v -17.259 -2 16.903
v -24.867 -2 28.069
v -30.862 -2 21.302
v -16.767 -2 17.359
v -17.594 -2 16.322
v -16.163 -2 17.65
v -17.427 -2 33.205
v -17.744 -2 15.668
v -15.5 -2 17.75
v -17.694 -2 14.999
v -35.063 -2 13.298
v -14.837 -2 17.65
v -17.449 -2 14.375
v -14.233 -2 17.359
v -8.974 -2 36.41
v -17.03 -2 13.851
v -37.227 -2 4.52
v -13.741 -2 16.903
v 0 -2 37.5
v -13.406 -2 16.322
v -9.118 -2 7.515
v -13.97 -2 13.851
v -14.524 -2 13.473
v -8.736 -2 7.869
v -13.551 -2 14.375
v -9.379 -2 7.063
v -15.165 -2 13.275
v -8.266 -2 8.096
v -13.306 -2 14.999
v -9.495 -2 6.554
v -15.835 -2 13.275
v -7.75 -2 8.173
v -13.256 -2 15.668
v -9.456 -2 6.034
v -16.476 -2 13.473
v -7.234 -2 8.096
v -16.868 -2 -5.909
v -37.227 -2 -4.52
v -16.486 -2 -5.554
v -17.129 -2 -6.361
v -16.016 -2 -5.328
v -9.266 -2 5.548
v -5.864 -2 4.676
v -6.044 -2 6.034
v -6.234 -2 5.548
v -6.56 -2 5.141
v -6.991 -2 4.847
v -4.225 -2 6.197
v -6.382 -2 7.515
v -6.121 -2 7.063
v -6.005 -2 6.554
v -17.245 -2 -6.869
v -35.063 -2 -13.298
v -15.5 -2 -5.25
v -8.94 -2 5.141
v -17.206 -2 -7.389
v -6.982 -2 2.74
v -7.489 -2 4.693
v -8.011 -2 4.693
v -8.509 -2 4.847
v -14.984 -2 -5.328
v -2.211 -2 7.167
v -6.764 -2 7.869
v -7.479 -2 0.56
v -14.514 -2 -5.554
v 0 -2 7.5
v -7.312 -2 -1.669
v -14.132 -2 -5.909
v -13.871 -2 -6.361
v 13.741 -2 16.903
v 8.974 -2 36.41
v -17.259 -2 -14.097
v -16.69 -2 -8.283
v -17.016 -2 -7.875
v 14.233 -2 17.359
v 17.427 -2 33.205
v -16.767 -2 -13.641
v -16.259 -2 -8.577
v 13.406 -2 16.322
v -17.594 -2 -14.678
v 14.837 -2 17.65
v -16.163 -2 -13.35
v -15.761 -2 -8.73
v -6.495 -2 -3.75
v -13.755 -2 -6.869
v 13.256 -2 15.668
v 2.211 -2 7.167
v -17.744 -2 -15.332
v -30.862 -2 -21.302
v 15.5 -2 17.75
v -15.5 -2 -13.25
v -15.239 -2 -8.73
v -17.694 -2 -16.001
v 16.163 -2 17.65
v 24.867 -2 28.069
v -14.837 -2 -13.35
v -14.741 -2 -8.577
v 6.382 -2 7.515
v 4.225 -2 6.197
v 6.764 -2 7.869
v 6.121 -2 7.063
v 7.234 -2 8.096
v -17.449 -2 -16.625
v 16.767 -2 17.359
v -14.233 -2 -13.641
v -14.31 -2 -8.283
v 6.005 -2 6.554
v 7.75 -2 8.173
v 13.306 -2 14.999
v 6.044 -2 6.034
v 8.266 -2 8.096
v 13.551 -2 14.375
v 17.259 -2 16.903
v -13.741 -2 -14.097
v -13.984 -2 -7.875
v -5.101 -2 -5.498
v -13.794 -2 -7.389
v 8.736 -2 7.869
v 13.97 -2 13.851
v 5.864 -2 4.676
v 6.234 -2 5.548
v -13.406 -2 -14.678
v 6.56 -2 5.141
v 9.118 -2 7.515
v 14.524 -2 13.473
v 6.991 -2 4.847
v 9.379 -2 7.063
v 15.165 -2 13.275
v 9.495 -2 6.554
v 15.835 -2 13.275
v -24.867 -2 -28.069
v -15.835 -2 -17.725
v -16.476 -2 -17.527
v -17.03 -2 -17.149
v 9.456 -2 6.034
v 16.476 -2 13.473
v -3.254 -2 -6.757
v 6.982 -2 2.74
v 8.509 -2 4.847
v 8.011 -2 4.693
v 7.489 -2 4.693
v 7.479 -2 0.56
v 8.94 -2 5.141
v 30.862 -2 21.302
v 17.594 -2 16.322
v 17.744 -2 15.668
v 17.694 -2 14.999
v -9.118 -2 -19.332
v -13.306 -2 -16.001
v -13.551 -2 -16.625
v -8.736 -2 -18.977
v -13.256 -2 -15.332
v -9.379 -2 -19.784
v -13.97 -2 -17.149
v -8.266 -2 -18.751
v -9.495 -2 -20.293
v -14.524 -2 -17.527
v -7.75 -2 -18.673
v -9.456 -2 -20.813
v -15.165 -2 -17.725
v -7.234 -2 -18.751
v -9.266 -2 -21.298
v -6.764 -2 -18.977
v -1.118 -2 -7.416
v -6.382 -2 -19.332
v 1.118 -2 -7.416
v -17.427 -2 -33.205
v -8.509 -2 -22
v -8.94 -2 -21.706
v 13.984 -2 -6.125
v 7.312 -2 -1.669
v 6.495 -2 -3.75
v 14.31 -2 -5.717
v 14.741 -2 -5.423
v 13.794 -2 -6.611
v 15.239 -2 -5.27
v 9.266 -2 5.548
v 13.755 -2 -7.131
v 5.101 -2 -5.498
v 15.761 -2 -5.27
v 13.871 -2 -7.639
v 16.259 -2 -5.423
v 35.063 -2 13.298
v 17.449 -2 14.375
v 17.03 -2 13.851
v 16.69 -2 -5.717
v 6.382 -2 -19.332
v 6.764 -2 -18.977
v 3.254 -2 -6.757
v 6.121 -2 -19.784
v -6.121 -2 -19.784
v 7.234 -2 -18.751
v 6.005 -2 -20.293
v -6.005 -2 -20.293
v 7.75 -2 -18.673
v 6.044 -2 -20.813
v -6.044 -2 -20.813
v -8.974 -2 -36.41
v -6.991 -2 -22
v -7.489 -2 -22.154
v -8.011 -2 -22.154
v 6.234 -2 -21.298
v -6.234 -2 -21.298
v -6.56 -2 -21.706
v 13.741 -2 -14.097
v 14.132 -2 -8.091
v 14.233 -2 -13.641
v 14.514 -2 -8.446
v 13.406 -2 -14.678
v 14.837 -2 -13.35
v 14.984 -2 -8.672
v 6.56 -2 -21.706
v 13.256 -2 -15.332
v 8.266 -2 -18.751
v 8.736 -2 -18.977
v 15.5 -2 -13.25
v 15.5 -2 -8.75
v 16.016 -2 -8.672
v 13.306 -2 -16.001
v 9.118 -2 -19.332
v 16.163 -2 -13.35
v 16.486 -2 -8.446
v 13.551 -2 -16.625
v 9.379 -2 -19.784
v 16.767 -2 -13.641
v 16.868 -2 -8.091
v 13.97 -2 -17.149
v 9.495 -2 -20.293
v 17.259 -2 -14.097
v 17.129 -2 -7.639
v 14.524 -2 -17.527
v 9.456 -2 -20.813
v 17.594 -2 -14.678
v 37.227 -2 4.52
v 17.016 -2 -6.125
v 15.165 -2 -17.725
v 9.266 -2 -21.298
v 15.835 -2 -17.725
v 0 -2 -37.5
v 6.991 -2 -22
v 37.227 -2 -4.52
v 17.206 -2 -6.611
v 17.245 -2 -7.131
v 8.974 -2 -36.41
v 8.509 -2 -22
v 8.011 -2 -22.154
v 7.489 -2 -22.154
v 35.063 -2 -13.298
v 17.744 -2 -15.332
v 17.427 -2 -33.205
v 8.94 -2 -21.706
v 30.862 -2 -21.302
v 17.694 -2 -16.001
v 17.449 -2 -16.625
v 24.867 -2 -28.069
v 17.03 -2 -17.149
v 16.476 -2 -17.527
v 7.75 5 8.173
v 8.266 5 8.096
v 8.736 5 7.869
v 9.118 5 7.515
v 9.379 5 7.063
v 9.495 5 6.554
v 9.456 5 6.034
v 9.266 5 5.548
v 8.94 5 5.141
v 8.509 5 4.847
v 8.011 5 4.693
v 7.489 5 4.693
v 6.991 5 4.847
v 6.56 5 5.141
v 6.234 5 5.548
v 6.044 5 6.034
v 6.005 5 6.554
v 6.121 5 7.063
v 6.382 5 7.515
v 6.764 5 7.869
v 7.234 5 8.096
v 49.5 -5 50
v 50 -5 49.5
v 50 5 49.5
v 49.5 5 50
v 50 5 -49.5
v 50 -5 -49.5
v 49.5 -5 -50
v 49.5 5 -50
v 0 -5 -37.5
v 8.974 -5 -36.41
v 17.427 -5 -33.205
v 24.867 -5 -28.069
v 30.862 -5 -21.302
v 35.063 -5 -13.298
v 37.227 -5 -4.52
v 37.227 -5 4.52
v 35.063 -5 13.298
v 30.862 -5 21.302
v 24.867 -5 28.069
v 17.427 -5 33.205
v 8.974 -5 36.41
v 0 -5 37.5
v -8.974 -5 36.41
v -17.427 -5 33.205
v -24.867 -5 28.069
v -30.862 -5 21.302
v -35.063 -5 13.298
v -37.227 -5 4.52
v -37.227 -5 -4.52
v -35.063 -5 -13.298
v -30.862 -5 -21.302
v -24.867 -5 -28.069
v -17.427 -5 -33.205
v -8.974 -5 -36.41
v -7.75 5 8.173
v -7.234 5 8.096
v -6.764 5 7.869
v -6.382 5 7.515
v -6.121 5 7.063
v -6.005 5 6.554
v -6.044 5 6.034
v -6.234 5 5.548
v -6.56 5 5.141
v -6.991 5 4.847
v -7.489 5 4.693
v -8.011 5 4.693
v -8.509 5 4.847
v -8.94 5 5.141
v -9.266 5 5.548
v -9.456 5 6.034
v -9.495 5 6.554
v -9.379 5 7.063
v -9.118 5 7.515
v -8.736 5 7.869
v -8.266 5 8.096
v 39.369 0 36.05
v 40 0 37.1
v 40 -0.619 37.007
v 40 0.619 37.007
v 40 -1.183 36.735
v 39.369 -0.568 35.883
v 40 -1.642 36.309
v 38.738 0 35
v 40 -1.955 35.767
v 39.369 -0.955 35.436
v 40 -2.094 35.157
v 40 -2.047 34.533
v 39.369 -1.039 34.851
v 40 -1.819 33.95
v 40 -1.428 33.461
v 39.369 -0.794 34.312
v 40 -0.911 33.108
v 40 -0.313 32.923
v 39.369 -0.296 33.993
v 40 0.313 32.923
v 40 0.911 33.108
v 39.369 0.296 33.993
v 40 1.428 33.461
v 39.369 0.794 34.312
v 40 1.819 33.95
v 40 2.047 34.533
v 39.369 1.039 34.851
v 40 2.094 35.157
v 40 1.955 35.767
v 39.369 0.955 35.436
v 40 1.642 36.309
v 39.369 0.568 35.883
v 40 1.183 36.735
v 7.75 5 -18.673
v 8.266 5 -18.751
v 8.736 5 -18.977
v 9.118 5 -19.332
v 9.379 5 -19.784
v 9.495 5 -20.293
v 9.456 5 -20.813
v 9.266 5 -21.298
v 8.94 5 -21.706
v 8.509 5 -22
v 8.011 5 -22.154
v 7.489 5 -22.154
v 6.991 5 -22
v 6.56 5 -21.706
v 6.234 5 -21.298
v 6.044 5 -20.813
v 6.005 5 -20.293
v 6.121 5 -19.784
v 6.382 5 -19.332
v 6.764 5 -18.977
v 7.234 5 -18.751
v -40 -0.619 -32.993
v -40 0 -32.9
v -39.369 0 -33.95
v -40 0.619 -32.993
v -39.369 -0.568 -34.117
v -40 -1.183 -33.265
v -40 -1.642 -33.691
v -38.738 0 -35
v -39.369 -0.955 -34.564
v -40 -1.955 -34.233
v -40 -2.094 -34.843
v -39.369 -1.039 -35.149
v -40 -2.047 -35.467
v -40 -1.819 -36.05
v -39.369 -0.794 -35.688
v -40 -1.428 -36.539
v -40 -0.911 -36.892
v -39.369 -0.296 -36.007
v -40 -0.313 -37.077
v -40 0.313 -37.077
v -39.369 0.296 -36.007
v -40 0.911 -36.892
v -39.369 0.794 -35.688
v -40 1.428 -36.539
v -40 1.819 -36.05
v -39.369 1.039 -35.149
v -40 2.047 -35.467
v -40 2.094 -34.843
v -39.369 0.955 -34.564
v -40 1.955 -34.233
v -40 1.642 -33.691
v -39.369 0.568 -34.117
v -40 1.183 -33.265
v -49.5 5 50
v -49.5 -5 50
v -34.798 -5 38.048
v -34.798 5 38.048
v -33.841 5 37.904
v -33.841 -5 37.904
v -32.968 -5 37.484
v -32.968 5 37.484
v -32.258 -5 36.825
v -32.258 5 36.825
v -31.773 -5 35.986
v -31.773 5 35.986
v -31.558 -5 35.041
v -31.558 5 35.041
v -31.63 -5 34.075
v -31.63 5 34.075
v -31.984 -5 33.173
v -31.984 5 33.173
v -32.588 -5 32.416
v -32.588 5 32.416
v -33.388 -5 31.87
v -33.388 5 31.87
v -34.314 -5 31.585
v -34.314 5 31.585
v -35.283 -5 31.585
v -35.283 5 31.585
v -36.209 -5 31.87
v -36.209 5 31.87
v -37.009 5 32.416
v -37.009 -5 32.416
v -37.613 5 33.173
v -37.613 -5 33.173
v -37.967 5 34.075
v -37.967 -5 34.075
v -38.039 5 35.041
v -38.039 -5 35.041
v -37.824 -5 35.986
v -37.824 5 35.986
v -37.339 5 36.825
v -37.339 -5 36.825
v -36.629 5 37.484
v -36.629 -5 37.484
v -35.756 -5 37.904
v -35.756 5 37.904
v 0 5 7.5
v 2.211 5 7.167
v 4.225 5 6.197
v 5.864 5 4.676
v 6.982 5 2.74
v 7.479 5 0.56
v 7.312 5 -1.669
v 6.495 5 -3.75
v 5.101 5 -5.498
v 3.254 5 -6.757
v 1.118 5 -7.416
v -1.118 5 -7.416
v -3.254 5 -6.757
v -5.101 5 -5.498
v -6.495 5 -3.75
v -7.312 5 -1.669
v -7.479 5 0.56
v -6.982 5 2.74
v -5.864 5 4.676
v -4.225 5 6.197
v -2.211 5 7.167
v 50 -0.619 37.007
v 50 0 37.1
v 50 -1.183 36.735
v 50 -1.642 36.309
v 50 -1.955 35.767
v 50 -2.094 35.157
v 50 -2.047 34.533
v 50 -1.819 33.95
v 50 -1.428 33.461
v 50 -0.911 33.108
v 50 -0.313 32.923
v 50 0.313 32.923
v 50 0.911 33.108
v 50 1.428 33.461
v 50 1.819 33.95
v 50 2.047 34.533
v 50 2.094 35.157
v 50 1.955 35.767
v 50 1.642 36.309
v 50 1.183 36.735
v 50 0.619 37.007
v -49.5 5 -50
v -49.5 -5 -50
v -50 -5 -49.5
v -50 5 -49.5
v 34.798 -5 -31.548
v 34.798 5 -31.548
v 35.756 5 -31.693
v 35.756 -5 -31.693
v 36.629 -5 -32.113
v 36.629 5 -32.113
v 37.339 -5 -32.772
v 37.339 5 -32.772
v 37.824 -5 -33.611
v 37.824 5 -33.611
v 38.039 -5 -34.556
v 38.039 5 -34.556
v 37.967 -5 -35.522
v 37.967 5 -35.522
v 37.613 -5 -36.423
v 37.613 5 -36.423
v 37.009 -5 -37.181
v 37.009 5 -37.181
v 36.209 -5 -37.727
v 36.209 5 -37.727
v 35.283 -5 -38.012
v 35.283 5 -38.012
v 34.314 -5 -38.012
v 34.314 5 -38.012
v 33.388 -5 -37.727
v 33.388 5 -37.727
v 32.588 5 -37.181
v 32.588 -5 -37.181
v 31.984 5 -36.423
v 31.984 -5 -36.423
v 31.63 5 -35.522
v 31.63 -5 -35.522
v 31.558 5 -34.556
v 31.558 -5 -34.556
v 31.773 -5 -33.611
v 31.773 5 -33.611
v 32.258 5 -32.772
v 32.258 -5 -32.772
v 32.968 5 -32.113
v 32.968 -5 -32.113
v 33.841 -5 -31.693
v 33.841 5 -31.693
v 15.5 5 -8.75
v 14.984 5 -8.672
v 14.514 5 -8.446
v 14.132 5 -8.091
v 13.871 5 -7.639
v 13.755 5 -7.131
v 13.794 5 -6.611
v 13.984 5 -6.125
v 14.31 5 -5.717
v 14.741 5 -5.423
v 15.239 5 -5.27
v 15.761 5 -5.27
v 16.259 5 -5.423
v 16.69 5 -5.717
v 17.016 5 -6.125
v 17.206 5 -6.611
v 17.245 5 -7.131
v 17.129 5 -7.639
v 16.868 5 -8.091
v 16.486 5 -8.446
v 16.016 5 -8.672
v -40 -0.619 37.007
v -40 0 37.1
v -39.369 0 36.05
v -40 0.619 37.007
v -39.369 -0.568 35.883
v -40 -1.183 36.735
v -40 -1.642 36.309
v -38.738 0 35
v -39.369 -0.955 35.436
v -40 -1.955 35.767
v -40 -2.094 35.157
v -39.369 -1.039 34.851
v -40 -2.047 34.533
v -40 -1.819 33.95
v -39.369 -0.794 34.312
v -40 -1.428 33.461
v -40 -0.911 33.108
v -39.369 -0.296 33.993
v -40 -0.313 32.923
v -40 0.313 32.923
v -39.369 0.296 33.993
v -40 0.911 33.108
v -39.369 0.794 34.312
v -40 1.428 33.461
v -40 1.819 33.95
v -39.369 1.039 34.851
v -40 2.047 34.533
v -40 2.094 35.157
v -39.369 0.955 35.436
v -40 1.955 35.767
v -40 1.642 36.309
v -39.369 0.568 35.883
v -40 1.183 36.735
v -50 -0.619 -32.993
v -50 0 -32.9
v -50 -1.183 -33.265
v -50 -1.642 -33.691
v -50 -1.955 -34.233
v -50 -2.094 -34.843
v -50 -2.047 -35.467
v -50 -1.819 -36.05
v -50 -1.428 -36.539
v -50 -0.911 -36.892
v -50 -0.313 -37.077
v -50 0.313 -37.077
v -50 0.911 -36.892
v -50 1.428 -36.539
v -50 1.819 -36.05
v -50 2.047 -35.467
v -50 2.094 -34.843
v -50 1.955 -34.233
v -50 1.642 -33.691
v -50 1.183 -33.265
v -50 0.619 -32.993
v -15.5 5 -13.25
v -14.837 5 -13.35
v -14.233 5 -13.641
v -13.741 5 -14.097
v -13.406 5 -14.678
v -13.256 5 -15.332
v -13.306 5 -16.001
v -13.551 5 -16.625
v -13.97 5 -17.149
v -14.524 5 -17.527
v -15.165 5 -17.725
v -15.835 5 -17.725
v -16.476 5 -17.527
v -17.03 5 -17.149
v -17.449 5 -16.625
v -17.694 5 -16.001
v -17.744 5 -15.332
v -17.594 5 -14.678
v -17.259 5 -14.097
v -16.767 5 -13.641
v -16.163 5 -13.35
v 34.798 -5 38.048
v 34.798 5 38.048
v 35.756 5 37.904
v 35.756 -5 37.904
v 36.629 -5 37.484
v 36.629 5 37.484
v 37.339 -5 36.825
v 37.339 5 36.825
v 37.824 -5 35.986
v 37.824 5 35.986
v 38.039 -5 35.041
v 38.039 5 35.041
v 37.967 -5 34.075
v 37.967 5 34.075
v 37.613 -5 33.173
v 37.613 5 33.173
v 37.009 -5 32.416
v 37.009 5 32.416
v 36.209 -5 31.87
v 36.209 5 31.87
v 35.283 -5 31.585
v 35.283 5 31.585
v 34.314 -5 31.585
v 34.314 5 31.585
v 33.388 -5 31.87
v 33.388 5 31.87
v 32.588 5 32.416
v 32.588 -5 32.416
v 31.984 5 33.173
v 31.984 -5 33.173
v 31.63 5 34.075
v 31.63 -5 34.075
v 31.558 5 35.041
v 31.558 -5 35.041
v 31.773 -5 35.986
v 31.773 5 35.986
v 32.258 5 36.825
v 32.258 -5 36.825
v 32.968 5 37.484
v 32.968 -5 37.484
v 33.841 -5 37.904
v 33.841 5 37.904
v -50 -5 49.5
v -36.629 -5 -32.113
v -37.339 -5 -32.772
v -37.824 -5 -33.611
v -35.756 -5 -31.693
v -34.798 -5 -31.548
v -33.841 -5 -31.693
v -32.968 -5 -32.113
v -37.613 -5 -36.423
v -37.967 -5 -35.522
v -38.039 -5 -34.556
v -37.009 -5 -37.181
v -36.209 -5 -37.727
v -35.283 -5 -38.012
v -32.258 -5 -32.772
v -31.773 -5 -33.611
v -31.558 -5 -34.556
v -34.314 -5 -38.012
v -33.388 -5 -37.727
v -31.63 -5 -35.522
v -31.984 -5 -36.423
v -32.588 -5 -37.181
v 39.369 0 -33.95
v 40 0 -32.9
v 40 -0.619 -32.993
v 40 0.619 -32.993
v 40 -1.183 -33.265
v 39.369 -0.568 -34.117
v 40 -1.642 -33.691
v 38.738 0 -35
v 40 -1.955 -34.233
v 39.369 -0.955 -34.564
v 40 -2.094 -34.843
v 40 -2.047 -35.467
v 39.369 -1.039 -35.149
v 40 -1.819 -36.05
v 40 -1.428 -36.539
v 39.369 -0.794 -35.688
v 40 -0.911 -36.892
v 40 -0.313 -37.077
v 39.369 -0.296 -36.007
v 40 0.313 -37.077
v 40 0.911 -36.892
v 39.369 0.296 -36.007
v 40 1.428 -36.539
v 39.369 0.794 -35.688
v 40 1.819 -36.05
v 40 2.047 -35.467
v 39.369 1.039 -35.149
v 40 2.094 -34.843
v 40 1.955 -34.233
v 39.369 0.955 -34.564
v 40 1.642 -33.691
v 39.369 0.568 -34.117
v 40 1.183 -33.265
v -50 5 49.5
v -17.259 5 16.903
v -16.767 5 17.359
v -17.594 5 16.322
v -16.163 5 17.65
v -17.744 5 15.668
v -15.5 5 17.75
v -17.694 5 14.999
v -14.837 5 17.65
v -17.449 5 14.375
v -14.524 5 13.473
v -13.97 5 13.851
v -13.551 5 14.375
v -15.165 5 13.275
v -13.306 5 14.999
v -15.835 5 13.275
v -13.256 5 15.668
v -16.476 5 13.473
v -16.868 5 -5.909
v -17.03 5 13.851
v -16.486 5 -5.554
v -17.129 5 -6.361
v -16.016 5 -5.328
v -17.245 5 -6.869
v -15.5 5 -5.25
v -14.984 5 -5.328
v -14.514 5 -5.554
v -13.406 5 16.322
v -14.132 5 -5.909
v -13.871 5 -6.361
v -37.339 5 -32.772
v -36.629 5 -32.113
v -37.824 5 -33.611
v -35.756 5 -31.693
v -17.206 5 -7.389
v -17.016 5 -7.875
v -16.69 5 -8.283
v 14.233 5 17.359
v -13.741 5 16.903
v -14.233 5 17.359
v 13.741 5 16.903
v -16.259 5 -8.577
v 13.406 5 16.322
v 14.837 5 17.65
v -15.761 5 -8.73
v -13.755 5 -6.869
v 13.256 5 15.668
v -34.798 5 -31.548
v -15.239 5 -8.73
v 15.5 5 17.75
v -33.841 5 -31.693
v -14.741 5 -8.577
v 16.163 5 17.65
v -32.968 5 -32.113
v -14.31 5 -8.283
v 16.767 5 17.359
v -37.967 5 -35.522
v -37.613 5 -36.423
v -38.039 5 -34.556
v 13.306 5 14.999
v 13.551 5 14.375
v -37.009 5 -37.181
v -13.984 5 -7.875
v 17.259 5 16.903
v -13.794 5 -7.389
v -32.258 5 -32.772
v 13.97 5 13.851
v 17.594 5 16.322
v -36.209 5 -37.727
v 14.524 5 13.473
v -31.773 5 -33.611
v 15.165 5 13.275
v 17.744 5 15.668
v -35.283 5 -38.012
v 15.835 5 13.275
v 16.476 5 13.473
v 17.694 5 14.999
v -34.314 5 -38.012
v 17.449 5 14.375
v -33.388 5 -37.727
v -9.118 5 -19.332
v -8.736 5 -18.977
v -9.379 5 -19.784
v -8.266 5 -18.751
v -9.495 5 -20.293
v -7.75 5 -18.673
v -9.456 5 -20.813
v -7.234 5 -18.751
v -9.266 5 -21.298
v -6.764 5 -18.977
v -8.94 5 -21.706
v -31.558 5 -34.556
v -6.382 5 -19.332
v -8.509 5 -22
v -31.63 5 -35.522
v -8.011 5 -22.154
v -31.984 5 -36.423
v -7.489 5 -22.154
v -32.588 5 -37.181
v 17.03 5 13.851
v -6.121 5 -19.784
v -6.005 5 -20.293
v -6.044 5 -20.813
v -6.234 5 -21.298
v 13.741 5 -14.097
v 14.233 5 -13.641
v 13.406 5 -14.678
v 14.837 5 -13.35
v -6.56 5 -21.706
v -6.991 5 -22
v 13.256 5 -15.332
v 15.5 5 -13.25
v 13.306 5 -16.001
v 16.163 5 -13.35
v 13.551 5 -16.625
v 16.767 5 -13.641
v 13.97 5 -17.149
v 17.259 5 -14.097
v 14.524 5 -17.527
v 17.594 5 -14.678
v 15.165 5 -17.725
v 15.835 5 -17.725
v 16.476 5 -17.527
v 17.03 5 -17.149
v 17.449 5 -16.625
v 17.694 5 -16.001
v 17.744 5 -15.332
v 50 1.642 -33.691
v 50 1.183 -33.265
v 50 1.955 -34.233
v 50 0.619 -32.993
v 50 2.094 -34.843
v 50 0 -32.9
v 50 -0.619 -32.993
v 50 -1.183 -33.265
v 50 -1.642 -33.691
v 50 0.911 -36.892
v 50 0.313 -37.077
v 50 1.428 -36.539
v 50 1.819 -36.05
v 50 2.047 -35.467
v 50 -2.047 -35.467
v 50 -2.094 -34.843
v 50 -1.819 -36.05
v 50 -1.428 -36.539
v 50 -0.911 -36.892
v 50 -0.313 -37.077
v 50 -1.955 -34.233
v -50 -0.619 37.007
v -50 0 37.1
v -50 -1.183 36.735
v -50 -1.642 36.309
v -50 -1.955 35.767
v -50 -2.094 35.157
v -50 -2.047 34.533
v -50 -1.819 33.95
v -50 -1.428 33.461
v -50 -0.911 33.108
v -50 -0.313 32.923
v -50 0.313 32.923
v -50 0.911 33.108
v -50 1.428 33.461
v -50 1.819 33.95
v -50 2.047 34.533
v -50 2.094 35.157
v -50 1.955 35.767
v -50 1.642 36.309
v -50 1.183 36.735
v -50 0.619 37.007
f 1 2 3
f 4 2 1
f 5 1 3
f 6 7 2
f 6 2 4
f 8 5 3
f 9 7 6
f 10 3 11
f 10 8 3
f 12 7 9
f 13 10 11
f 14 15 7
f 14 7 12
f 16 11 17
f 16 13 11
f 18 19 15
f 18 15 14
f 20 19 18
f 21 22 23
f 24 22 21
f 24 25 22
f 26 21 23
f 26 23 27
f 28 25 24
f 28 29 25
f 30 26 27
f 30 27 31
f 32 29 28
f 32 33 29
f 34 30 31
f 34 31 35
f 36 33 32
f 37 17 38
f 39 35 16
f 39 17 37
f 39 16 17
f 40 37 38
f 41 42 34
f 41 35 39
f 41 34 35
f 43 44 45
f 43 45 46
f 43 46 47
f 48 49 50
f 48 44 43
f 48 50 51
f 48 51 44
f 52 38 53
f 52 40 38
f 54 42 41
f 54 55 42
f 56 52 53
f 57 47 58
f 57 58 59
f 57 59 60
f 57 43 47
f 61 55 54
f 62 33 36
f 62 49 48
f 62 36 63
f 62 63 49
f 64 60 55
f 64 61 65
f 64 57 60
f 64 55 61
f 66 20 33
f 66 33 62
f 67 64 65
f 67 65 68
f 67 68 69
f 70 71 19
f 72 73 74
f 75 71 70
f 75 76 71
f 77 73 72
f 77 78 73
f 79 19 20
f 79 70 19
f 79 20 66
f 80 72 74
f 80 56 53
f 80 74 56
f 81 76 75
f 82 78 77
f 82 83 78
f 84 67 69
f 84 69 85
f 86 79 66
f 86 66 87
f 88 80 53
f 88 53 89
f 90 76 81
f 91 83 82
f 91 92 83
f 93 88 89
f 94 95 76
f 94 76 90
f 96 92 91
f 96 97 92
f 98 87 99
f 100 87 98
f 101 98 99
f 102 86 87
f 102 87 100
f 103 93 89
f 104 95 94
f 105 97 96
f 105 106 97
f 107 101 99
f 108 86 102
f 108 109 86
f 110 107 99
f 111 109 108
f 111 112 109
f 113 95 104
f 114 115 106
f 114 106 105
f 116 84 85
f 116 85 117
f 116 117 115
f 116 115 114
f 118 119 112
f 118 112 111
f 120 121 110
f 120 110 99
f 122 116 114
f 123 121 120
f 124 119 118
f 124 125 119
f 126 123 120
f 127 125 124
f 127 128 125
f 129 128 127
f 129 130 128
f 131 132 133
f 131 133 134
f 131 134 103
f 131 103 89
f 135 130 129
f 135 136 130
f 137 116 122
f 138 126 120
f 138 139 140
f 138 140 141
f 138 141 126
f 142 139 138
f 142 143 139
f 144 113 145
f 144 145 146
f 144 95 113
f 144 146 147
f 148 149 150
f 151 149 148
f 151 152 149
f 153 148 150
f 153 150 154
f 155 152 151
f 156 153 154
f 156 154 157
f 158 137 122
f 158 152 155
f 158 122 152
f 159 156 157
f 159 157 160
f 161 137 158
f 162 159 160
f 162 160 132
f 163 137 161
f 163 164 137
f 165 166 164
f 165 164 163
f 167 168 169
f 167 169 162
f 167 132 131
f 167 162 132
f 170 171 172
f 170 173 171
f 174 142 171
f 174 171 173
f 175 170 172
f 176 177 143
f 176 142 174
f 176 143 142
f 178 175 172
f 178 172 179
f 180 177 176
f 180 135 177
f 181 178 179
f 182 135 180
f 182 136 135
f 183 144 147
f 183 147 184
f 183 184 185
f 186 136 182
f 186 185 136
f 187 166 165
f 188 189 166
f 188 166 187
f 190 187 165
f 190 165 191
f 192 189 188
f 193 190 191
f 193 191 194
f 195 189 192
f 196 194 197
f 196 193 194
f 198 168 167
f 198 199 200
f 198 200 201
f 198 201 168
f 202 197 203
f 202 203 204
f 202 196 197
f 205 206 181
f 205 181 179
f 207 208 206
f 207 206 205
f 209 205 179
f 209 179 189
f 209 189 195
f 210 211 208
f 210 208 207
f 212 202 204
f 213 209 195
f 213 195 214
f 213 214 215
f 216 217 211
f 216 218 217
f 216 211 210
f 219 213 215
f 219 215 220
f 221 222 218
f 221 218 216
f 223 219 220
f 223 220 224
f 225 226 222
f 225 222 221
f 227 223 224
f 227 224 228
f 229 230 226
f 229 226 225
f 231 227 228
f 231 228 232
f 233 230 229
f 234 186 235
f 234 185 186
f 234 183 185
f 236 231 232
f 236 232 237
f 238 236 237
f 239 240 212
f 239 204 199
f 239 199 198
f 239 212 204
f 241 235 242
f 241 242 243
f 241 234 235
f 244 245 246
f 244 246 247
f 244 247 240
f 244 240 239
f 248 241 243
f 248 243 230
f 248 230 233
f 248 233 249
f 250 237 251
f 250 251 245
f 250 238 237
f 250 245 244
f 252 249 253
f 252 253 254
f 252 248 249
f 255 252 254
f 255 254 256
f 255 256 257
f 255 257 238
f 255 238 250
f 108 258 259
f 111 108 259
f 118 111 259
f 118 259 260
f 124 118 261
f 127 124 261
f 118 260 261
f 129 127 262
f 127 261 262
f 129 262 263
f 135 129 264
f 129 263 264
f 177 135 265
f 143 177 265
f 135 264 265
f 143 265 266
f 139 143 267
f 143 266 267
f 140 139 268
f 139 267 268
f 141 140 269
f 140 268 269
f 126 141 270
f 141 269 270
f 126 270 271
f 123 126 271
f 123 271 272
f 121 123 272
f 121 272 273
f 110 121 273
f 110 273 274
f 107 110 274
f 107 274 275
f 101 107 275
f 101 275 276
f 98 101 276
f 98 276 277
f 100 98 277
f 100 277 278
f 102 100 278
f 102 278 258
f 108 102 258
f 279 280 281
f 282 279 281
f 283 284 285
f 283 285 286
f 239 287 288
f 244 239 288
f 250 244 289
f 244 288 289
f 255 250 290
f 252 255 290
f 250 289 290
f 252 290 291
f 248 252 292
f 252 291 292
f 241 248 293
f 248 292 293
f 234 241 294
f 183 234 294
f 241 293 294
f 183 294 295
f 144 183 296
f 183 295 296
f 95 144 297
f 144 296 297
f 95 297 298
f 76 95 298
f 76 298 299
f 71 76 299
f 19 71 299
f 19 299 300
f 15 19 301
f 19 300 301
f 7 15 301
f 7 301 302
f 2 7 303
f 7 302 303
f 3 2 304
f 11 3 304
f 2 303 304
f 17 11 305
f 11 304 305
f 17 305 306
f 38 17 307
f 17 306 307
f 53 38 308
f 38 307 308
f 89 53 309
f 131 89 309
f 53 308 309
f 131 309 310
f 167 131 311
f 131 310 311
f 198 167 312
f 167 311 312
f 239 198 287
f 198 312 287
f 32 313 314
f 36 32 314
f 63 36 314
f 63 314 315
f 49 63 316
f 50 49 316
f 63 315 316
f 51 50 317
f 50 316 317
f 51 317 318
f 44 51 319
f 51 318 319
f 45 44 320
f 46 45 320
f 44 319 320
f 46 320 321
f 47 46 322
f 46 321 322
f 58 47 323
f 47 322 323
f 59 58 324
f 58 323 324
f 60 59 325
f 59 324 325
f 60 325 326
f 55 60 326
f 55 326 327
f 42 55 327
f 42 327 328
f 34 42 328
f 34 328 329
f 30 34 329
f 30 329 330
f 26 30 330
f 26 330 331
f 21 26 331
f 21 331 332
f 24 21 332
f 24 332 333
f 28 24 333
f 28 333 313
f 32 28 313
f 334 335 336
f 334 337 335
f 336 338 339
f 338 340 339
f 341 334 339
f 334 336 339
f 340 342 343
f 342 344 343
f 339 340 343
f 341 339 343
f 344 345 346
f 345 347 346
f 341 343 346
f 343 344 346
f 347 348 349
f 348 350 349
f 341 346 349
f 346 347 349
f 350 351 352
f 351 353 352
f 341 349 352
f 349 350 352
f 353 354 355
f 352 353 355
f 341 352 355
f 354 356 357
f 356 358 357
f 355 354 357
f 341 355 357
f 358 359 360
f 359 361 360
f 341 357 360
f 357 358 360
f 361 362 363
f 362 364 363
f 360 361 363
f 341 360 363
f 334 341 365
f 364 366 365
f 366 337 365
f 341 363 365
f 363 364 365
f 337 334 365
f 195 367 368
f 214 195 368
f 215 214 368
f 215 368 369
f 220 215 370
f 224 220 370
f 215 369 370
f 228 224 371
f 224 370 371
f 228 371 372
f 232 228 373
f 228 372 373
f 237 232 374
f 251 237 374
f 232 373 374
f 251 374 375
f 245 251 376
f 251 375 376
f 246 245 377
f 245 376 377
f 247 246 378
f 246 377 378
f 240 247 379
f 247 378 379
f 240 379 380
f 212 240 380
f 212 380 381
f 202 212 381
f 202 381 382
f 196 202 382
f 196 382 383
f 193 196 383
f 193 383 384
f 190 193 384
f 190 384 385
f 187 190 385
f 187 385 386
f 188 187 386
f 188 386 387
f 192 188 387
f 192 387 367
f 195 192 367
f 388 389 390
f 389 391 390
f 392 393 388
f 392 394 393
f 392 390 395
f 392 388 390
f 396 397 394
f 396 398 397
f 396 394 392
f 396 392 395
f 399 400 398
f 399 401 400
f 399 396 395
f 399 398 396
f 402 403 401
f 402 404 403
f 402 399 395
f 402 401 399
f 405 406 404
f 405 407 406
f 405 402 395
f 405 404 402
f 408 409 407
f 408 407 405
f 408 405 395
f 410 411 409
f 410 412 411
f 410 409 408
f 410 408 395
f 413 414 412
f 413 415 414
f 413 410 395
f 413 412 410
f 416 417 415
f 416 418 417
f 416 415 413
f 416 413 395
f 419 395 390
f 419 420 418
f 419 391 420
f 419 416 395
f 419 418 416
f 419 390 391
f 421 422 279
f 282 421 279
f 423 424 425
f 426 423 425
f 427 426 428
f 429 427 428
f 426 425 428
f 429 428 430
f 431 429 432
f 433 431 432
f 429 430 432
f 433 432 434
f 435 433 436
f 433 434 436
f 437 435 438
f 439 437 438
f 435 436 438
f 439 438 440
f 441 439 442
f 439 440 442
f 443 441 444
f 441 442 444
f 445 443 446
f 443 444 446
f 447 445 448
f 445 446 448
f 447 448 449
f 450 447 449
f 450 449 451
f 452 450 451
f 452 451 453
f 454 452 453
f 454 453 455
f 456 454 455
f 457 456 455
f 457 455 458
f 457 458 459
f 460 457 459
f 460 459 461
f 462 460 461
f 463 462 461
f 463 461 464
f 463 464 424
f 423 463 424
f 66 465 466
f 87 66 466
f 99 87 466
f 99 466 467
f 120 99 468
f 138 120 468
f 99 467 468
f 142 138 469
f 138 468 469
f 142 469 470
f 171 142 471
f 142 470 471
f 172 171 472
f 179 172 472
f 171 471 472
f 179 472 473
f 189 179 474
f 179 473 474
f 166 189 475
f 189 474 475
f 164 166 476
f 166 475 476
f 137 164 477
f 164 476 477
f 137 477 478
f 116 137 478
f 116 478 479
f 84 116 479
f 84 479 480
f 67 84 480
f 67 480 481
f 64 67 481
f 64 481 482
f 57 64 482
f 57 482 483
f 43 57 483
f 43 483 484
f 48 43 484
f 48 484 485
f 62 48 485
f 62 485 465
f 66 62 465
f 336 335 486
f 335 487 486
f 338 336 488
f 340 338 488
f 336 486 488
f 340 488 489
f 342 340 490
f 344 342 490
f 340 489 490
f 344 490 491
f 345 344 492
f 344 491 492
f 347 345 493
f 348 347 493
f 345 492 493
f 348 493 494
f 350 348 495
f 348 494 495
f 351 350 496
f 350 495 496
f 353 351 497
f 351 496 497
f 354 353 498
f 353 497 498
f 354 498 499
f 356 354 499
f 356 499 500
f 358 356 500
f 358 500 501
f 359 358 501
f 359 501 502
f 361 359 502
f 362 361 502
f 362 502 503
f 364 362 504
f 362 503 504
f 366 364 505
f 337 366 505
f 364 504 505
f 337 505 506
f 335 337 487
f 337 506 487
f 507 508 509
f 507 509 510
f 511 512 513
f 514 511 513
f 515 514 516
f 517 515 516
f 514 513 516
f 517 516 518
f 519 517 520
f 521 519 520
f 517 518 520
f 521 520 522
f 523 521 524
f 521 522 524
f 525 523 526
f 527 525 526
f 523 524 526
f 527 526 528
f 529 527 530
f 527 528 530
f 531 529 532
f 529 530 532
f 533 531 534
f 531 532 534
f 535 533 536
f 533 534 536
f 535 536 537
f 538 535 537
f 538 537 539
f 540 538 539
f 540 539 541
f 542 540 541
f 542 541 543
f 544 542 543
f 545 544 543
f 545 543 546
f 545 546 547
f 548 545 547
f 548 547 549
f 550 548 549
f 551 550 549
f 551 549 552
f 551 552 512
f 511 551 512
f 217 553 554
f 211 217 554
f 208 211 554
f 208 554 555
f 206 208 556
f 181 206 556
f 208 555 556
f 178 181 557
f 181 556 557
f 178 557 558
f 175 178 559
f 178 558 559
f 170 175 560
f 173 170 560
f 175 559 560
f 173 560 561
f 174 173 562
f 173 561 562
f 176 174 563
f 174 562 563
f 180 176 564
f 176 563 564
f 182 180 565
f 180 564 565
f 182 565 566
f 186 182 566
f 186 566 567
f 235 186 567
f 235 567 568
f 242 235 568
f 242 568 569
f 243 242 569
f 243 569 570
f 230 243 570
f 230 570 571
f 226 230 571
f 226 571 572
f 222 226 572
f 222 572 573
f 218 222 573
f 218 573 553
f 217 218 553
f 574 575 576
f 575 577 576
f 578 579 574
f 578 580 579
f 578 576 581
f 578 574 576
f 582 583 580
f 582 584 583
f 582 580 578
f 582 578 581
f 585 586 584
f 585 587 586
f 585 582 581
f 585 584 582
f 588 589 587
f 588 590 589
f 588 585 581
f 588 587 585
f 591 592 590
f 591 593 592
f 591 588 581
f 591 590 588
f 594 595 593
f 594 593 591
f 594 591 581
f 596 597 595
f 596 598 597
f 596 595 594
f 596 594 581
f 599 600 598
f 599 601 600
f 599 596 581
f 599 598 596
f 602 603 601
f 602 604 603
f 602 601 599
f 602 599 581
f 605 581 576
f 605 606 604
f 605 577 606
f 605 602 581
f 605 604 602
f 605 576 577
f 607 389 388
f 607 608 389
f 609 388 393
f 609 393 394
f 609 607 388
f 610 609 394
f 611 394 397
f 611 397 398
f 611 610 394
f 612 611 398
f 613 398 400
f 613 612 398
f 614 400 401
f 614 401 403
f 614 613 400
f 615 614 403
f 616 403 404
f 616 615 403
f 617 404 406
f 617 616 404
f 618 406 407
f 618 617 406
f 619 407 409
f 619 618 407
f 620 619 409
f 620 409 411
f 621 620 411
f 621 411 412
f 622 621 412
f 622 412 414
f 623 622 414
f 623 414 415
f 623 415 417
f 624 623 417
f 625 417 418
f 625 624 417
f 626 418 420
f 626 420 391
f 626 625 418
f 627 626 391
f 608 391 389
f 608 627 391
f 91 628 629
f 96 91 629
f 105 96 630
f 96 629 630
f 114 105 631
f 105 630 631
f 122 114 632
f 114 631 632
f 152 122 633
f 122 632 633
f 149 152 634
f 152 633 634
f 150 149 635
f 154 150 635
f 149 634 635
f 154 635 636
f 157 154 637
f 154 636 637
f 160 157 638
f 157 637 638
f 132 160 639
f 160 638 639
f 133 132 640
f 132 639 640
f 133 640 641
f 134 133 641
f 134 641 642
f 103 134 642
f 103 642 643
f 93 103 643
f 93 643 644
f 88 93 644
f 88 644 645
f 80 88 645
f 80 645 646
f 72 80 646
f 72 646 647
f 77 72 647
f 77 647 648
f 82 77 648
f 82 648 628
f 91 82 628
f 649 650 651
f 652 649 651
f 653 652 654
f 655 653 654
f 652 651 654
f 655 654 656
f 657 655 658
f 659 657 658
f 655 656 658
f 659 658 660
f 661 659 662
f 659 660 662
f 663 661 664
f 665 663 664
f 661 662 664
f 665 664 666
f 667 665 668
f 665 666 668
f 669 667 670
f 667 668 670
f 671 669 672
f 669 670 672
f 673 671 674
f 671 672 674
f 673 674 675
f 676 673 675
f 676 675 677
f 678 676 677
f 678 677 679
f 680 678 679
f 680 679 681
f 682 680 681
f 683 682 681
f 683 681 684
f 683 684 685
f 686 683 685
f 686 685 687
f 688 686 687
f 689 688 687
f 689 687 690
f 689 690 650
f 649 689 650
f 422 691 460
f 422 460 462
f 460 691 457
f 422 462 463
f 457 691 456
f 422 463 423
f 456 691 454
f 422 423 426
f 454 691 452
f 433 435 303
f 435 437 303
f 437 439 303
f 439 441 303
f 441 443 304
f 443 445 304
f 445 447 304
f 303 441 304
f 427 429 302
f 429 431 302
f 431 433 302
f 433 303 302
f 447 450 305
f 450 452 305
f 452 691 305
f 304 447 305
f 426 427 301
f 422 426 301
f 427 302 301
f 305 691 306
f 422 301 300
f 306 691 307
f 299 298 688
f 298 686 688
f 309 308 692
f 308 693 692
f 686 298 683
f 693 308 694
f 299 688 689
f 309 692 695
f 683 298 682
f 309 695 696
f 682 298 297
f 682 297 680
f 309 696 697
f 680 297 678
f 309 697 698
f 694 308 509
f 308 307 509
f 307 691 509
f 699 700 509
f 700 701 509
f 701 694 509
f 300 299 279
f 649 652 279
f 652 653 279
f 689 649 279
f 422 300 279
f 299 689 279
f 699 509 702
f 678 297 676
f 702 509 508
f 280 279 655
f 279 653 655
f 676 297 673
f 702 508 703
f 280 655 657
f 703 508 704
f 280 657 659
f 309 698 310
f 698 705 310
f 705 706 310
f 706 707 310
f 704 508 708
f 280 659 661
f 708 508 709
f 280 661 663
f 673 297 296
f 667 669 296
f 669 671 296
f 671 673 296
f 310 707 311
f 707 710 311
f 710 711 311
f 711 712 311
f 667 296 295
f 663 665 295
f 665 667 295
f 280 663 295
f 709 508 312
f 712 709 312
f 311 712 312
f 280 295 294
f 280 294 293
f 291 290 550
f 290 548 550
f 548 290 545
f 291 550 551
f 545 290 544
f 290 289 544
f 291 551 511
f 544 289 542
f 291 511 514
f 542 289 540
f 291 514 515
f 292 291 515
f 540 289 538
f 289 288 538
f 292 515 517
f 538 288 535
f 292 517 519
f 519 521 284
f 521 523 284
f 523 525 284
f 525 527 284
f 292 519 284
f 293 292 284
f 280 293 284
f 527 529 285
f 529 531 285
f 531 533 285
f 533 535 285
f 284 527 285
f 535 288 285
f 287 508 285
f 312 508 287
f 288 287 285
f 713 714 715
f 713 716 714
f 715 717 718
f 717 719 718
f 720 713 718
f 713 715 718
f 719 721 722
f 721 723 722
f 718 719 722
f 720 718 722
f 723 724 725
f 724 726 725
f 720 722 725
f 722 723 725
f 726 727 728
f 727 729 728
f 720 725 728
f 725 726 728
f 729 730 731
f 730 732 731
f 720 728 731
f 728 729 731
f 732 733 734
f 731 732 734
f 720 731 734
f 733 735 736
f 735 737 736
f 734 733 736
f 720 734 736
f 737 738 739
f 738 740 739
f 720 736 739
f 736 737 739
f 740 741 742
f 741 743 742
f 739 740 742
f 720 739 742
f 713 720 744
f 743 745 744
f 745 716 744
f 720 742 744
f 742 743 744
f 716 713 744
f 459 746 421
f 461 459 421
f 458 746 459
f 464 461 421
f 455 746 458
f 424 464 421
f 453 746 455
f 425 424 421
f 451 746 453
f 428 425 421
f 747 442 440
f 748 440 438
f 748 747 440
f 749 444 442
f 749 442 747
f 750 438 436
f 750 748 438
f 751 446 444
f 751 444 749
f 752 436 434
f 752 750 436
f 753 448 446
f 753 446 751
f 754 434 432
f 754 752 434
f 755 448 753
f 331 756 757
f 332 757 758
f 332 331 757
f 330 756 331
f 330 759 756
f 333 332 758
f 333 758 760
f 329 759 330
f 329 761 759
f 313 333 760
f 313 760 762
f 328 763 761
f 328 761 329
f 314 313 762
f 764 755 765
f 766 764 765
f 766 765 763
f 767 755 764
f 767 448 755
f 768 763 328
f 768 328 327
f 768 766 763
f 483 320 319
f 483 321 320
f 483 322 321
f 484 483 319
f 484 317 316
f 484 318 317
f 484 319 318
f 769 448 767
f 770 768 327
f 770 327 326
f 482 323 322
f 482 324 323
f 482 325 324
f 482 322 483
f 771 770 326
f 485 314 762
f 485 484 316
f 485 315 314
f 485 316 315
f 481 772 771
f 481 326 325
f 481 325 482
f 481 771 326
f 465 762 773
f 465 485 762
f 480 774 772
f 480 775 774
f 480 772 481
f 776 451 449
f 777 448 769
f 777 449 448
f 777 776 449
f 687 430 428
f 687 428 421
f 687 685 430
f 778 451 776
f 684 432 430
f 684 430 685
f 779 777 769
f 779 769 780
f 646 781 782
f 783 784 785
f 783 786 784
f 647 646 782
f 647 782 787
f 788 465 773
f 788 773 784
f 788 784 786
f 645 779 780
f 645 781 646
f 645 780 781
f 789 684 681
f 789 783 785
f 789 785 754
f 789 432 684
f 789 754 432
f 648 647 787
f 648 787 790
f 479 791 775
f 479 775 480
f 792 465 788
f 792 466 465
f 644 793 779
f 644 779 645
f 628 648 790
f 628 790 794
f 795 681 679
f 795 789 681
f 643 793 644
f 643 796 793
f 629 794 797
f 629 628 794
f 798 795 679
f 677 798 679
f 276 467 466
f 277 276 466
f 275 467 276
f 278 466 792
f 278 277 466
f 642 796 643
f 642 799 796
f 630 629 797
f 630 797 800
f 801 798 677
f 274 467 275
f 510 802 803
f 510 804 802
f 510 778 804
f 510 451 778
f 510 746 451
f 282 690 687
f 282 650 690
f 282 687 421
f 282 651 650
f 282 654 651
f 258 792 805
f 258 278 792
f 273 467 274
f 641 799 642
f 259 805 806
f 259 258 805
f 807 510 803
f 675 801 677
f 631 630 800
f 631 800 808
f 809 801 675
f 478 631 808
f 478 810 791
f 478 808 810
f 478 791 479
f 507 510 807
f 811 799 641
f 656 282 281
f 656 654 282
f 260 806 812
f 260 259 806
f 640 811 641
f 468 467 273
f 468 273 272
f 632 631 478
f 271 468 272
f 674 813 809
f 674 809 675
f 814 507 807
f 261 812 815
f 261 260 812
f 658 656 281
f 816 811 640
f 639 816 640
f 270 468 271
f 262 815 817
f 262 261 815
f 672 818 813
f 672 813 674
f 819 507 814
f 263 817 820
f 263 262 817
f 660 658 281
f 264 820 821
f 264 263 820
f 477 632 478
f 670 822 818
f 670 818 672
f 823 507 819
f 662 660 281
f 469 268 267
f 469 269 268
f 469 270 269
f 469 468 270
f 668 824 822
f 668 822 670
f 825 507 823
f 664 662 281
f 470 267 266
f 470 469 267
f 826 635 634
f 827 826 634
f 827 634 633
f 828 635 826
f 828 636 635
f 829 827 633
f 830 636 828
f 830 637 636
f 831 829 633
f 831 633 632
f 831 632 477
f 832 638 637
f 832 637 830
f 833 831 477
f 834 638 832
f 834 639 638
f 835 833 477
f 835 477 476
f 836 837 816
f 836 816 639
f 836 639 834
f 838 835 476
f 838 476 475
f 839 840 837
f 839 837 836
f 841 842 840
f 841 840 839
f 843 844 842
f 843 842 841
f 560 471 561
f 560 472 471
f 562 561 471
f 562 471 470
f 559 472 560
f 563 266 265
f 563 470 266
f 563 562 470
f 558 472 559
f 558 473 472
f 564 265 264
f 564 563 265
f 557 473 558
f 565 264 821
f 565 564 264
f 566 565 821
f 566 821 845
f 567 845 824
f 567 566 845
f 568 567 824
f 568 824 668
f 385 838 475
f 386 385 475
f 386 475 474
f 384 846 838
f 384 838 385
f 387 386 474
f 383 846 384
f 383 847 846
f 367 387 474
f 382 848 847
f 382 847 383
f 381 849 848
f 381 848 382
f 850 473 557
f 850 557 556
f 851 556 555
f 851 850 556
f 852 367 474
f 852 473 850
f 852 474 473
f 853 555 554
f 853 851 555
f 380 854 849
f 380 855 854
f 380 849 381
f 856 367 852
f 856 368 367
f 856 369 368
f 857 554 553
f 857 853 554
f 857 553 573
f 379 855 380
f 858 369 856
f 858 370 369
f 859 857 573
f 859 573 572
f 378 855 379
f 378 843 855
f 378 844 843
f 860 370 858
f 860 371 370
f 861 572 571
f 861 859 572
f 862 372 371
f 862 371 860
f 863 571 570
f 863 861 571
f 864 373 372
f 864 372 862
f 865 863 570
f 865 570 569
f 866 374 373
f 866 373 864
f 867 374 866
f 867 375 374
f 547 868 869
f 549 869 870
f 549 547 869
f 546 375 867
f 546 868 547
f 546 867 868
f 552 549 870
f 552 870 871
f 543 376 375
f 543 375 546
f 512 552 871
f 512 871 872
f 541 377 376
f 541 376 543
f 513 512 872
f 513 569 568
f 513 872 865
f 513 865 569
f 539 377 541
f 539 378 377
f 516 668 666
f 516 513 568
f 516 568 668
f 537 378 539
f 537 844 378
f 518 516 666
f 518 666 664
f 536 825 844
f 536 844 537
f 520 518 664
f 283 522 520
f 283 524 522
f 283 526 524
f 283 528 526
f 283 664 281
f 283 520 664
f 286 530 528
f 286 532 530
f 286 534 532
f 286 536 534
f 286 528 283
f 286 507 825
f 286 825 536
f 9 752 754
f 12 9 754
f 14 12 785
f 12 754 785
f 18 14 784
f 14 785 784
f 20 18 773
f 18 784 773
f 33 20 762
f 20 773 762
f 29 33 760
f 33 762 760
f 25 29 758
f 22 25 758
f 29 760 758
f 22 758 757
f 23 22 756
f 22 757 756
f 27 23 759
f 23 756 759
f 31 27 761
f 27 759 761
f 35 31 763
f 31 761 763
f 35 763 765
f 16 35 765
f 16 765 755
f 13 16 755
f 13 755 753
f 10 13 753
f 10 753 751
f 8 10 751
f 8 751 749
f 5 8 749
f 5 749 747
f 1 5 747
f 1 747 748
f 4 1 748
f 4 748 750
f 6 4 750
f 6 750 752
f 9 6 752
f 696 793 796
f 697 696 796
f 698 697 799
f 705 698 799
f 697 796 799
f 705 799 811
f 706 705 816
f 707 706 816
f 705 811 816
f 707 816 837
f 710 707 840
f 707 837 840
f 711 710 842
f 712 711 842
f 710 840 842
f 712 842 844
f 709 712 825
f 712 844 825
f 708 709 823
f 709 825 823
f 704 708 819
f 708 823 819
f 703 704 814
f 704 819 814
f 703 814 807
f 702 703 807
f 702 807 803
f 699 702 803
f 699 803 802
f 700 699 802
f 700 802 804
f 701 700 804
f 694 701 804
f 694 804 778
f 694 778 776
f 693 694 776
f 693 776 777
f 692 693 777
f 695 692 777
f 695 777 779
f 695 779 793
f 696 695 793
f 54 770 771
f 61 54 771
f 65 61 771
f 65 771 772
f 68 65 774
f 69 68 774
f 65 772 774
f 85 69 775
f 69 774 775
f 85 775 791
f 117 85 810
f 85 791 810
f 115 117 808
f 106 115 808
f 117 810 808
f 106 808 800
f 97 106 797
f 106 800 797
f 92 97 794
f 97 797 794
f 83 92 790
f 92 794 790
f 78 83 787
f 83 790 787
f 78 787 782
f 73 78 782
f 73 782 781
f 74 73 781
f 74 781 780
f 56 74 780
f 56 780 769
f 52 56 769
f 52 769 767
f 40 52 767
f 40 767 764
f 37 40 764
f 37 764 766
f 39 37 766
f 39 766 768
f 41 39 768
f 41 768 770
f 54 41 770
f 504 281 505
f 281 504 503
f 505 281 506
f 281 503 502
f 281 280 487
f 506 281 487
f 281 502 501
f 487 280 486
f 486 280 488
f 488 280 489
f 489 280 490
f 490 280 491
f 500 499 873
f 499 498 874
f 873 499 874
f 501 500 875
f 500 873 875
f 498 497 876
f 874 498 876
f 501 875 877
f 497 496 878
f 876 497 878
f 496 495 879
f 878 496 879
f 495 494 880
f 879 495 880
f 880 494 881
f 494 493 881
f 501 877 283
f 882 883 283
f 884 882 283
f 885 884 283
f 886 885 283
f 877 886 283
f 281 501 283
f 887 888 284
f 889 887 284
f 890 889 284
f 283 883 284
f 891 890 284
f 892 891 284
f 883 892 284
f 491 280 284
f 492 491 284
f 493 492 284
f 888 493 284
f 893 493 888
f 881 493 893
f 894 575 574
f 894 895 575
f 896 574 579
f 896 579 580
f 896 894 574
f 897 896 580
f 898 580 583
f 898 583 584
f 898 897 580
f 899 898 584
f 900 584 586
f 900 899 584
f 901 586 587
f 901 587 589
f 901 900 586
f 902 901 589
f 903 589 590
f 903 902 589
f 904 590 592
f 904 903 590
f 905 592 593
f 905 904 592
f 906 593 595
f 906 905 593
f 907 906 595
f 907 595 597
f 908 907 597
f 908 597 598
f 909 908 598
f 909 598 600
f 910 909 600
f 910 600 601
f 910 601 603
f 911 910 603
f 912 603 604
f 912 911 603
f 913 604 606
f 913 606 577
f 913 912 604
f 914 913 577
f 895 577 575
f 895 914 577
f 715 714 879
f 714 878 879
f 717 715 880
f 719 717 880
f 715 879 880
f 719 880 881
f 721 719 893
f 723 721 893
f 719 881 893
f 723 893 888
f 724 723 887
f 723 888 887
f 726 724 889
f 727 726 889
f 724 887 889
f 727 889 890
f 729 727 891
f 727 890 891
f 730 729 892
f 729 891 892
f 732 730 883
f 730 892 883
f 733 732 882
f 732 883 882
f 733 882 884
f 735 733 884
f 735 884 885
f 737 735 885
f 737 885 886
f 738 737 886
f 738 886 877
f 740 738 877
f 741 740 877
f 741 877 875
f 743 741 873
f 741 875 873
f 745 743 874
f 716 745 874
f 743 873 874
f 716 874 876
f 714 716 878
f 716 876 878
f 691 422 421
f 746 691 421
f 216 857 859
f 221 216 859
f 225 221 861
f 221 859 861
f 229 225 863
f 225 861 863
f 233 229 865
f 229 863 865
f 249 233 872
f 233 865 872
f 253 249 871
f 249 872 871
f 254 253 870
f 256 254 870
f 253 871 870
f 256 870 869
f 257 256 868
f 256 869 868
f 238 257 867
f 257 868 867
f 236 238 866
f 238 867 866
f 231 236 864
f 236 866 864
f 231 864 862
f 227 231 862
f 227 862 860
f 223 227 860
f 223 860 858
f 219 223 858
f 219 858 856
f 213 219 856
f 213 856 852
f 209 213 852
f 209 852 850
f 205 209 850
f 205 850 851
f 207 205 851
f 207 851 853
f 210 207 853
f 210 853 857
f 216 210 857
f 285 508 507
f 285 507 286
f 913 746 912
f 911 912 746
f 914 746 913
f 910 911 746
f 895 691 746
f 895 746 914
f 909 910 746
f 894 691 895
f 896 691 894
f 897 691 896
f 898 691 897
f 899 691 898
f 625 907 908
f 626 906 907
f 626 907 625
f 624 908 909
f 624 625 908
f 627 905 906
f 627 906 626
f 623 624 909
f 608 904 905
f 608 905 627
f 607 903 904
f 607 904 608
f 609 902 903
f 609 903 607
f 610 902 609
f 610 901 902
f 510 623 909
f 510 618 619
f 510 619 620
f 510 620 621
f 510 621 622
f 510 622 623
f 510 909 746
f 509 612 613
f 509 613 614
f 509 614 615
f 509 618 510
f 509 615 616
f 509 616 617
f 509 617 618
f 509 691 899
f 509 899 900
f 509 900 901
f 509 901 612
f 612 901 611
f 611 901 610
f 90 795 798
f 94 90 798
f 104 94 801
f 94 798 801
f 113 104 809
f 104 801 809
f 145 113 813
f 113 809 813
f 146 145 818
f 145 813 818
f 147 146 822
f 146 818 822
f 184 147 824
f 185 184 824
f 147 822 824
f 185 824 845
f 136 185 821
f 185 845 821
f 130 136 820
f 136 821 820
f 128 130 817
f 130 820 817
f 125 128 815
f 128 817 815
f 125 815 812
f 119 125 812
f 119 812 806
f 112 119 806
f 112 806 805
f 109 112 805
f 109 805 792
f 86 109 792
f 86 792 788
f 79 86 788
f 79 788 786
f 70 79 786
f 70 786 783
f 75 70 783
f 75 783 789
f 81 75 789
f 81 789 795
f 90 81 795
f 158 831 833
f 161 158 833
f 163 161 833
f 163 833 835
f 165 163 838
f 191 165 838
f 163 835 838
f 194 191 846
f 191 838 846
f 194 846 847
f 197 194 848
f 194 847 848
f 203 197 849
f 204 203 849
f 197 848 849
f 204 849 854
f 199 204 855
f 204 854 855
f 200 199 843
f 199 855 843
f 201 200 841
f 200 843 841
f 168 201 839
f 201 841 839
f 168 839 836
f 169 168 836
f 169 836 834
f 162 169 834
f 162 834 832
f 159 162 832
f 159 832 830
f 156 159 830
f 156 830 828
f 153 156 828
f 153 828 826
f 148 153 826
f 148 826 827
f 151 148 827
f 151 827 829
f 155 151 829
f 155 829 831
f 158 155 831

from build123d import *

# Parameters (mm, degrees)
BOSS_EXTRUDE1_DEPTH                  = 5
BOSS_EXTRUDE1_DEPTH_BACK             = 5
SKETCH1_W                            = 100
SKETCH1_H                            = 100
SKETCH2_R                            = 7.5
SKETCH2_R_2                          = 3.25
CUT_EXTRUDE1_DEPTH                   = 12.7
TAP_DRILL_FOR_M5X0_8_TAP1_AT_2_COUNT = 2
TAP_DRILL_FOR_M5X0_8_TAP1_AT_2_PITCH = 70
SKETCH11_R                           = 37.5
CUT_EXTRUDE2_DEPTH                   = 3
CHAMFER1_SIZE                        = 0.5
SKETCH12_R                           = 1.75
CUT_EXTRUDE3_DEPTH                   = 72.414284285
SKETCH13_R                           = 2.25
CUT_EXTRUDE4_DEPTH                   = 10


with BuildPart() as part:
    # Sketch1 → Boss-Extrude1 (new, two sides: drawn at the far end of the back side and taken through both)
    with BuildSketch(Plane(origin=(0, 0, 0), x_dir=(1, 0, 0), z_dir=(0, 1, 0)).offset(-BOSS_EXTRUDE1_DEPTH_BACK)):
        Rectangle(SKETCH1_W, SKETCH1_H)
    extrude(amount=BOSS_EXTRUDE1_DEPTH + BOSS_EXTRUDE1_DEPTH_BACK)

    # Sketch2 → Cut-Extrude1 (cut)
    with BuildSketch(Plane(origin=(0, 5, 0), x_dir=(1, 0, 0), z_dir=(0, 1, 0))):
        Circle(SKETCH2_R)
        with Locations((-34.798492469, 34.798492469)):
            Circle(SKETCH2_R_2)
        with Locations((34.798492469, 34.798492469)):
            Circle(SKETCH2_R_2)
        with Locations((34.798492469, -34.798492469)):
            Circle(SKETCH2_R_2)
        with Locations((-34.798492469, -34.798492469)):
            Circle(SKETCH2_R_2)
    extrude(amount=-CUT_EXTRUDE1_DEPTH, mode=Mode.SUBTRACT)

    # Sketch10 → Tap Drill for M5x0.8 Tap1 (revolve, cut)
    with BuildSketch(Plane(origin=(-50, 0, -35), x_dir=(0, 0, 1), z_dir=(0, 1, 0))):
        Polygon((0, 0), (0, 11.2618073), (2.1, 10), (2.1, 0), align=None)
    tap_drill_for_m5x0_8_tap1 = revolve(axis=Axis((-56.35, 0, -35), (1, 0, 0)), mode=Mode.SUBTRACT)

    # Tap Drill for M5x0.8 Tap1 at 2: Tap Drill for M5x0.8 Tap1 ×2
    with Locations(*[(0, 0, i * TAP_DRILL_FOR_M5X0_8_TAP1_AT_2_PITCH) for i in range(1, TAP_DRILL_FOR_M5X0_8_TAP1_AT_2_COUNT)]):
        add(tap_drill_for_m5x0_8_tap1, mode=Mode.SUBTRACT)

    # Sketch11 → Cut-Extrude2 (cut)
    with BuildSketch(Plane.XZ.offset(5)):
        Circle(SKETCH11_R)
    extrude(amount=-CUT_EXTRUDE2_DEPTH, mode=Mode.SUBTRACT)

    # Chamfer1
    chamfer1_edges = [part.edges().sort_by_distance(p)[0] for p in [
        (50, 0, -50),
        (50, 0, 50),
        (-50, 0, 50),
        (-50, 0, -50),
    ]]
    chamfer(chamfer1_edges, length=CHAMFER1_SIZE)

    # Mirror1: Tap Drill for M5x0.8 Tap1 across plane
    add(tap_drill_for_m5x0_8_tap1.mirror(Plane.ZY), mode=Mode.SUBTRACT)

    # Mirror1 copy 1 sketch → Mirror1 copy 1 (revolve, cut)
    with BuildSketch(Plane(origin=(50, 0, 35), x_dir=(0, 0, 1), z_dir=(0, 1, 0))):
        Polygon((0, 0), (0, -11.2618073), (2.1, -10), (2.1, 0), align=None)
    revolve(axis=Axis((56.35, 0, 35), (1, 0, 0)), mode=Mode.SUBTRACT)

    # Sketch12 → Cut-Extrude3 (cut, through all)
    with BuildSketch(Plane(origin=(0, 5, 0), x_dir=(1, 0, 0), z_dir=(0, 1, 0))):
        with Locations((-15.5, 7)):
            Circle(SKETCH12_R)
        with Locations((15.5, 7)):
            Circle(SKETCH12_R)
        with Locations((-7.75, 20.423393759)):
            Circle(SKETCH12_R)
        with Locations((7.75, 20.423393759)):
            Circle(SKETCH12_R)
        with Locations((7.75, -6.423393759)):
            Circle(SKETCH12_R)
        with Locations((-7.75, -6.423393759)):
            Circle(SKETCH12_R)
    extrude(amount=-CUT_EXTRUDE3_DEPTH, mode=Mode.SUBTRACT)

    # Sketch13 → Cut-Extrude4 (cut)
    with BuildSketch(Plane(origin=(0, 5, 0), x_dir=(1, 0, 0), z_dir=(0, 1, 0))):
        with Locations((-15.5, -15.5)):
            Circle(SKETCH13_R)
        with Locations((-15.5, 15.5)):
            Circle(SKETCH13_R)
        with Locations((15.5, 15.5)):
            Circle(SKETCH13_R)
        with Locations((15.5, -15.5)):
            Circle(SKETCH13_R)
    extrude(amount=-CUT_EXTRUDE4_DEPTH, mode=Mode.SUBTRACT)


solid = part.part
